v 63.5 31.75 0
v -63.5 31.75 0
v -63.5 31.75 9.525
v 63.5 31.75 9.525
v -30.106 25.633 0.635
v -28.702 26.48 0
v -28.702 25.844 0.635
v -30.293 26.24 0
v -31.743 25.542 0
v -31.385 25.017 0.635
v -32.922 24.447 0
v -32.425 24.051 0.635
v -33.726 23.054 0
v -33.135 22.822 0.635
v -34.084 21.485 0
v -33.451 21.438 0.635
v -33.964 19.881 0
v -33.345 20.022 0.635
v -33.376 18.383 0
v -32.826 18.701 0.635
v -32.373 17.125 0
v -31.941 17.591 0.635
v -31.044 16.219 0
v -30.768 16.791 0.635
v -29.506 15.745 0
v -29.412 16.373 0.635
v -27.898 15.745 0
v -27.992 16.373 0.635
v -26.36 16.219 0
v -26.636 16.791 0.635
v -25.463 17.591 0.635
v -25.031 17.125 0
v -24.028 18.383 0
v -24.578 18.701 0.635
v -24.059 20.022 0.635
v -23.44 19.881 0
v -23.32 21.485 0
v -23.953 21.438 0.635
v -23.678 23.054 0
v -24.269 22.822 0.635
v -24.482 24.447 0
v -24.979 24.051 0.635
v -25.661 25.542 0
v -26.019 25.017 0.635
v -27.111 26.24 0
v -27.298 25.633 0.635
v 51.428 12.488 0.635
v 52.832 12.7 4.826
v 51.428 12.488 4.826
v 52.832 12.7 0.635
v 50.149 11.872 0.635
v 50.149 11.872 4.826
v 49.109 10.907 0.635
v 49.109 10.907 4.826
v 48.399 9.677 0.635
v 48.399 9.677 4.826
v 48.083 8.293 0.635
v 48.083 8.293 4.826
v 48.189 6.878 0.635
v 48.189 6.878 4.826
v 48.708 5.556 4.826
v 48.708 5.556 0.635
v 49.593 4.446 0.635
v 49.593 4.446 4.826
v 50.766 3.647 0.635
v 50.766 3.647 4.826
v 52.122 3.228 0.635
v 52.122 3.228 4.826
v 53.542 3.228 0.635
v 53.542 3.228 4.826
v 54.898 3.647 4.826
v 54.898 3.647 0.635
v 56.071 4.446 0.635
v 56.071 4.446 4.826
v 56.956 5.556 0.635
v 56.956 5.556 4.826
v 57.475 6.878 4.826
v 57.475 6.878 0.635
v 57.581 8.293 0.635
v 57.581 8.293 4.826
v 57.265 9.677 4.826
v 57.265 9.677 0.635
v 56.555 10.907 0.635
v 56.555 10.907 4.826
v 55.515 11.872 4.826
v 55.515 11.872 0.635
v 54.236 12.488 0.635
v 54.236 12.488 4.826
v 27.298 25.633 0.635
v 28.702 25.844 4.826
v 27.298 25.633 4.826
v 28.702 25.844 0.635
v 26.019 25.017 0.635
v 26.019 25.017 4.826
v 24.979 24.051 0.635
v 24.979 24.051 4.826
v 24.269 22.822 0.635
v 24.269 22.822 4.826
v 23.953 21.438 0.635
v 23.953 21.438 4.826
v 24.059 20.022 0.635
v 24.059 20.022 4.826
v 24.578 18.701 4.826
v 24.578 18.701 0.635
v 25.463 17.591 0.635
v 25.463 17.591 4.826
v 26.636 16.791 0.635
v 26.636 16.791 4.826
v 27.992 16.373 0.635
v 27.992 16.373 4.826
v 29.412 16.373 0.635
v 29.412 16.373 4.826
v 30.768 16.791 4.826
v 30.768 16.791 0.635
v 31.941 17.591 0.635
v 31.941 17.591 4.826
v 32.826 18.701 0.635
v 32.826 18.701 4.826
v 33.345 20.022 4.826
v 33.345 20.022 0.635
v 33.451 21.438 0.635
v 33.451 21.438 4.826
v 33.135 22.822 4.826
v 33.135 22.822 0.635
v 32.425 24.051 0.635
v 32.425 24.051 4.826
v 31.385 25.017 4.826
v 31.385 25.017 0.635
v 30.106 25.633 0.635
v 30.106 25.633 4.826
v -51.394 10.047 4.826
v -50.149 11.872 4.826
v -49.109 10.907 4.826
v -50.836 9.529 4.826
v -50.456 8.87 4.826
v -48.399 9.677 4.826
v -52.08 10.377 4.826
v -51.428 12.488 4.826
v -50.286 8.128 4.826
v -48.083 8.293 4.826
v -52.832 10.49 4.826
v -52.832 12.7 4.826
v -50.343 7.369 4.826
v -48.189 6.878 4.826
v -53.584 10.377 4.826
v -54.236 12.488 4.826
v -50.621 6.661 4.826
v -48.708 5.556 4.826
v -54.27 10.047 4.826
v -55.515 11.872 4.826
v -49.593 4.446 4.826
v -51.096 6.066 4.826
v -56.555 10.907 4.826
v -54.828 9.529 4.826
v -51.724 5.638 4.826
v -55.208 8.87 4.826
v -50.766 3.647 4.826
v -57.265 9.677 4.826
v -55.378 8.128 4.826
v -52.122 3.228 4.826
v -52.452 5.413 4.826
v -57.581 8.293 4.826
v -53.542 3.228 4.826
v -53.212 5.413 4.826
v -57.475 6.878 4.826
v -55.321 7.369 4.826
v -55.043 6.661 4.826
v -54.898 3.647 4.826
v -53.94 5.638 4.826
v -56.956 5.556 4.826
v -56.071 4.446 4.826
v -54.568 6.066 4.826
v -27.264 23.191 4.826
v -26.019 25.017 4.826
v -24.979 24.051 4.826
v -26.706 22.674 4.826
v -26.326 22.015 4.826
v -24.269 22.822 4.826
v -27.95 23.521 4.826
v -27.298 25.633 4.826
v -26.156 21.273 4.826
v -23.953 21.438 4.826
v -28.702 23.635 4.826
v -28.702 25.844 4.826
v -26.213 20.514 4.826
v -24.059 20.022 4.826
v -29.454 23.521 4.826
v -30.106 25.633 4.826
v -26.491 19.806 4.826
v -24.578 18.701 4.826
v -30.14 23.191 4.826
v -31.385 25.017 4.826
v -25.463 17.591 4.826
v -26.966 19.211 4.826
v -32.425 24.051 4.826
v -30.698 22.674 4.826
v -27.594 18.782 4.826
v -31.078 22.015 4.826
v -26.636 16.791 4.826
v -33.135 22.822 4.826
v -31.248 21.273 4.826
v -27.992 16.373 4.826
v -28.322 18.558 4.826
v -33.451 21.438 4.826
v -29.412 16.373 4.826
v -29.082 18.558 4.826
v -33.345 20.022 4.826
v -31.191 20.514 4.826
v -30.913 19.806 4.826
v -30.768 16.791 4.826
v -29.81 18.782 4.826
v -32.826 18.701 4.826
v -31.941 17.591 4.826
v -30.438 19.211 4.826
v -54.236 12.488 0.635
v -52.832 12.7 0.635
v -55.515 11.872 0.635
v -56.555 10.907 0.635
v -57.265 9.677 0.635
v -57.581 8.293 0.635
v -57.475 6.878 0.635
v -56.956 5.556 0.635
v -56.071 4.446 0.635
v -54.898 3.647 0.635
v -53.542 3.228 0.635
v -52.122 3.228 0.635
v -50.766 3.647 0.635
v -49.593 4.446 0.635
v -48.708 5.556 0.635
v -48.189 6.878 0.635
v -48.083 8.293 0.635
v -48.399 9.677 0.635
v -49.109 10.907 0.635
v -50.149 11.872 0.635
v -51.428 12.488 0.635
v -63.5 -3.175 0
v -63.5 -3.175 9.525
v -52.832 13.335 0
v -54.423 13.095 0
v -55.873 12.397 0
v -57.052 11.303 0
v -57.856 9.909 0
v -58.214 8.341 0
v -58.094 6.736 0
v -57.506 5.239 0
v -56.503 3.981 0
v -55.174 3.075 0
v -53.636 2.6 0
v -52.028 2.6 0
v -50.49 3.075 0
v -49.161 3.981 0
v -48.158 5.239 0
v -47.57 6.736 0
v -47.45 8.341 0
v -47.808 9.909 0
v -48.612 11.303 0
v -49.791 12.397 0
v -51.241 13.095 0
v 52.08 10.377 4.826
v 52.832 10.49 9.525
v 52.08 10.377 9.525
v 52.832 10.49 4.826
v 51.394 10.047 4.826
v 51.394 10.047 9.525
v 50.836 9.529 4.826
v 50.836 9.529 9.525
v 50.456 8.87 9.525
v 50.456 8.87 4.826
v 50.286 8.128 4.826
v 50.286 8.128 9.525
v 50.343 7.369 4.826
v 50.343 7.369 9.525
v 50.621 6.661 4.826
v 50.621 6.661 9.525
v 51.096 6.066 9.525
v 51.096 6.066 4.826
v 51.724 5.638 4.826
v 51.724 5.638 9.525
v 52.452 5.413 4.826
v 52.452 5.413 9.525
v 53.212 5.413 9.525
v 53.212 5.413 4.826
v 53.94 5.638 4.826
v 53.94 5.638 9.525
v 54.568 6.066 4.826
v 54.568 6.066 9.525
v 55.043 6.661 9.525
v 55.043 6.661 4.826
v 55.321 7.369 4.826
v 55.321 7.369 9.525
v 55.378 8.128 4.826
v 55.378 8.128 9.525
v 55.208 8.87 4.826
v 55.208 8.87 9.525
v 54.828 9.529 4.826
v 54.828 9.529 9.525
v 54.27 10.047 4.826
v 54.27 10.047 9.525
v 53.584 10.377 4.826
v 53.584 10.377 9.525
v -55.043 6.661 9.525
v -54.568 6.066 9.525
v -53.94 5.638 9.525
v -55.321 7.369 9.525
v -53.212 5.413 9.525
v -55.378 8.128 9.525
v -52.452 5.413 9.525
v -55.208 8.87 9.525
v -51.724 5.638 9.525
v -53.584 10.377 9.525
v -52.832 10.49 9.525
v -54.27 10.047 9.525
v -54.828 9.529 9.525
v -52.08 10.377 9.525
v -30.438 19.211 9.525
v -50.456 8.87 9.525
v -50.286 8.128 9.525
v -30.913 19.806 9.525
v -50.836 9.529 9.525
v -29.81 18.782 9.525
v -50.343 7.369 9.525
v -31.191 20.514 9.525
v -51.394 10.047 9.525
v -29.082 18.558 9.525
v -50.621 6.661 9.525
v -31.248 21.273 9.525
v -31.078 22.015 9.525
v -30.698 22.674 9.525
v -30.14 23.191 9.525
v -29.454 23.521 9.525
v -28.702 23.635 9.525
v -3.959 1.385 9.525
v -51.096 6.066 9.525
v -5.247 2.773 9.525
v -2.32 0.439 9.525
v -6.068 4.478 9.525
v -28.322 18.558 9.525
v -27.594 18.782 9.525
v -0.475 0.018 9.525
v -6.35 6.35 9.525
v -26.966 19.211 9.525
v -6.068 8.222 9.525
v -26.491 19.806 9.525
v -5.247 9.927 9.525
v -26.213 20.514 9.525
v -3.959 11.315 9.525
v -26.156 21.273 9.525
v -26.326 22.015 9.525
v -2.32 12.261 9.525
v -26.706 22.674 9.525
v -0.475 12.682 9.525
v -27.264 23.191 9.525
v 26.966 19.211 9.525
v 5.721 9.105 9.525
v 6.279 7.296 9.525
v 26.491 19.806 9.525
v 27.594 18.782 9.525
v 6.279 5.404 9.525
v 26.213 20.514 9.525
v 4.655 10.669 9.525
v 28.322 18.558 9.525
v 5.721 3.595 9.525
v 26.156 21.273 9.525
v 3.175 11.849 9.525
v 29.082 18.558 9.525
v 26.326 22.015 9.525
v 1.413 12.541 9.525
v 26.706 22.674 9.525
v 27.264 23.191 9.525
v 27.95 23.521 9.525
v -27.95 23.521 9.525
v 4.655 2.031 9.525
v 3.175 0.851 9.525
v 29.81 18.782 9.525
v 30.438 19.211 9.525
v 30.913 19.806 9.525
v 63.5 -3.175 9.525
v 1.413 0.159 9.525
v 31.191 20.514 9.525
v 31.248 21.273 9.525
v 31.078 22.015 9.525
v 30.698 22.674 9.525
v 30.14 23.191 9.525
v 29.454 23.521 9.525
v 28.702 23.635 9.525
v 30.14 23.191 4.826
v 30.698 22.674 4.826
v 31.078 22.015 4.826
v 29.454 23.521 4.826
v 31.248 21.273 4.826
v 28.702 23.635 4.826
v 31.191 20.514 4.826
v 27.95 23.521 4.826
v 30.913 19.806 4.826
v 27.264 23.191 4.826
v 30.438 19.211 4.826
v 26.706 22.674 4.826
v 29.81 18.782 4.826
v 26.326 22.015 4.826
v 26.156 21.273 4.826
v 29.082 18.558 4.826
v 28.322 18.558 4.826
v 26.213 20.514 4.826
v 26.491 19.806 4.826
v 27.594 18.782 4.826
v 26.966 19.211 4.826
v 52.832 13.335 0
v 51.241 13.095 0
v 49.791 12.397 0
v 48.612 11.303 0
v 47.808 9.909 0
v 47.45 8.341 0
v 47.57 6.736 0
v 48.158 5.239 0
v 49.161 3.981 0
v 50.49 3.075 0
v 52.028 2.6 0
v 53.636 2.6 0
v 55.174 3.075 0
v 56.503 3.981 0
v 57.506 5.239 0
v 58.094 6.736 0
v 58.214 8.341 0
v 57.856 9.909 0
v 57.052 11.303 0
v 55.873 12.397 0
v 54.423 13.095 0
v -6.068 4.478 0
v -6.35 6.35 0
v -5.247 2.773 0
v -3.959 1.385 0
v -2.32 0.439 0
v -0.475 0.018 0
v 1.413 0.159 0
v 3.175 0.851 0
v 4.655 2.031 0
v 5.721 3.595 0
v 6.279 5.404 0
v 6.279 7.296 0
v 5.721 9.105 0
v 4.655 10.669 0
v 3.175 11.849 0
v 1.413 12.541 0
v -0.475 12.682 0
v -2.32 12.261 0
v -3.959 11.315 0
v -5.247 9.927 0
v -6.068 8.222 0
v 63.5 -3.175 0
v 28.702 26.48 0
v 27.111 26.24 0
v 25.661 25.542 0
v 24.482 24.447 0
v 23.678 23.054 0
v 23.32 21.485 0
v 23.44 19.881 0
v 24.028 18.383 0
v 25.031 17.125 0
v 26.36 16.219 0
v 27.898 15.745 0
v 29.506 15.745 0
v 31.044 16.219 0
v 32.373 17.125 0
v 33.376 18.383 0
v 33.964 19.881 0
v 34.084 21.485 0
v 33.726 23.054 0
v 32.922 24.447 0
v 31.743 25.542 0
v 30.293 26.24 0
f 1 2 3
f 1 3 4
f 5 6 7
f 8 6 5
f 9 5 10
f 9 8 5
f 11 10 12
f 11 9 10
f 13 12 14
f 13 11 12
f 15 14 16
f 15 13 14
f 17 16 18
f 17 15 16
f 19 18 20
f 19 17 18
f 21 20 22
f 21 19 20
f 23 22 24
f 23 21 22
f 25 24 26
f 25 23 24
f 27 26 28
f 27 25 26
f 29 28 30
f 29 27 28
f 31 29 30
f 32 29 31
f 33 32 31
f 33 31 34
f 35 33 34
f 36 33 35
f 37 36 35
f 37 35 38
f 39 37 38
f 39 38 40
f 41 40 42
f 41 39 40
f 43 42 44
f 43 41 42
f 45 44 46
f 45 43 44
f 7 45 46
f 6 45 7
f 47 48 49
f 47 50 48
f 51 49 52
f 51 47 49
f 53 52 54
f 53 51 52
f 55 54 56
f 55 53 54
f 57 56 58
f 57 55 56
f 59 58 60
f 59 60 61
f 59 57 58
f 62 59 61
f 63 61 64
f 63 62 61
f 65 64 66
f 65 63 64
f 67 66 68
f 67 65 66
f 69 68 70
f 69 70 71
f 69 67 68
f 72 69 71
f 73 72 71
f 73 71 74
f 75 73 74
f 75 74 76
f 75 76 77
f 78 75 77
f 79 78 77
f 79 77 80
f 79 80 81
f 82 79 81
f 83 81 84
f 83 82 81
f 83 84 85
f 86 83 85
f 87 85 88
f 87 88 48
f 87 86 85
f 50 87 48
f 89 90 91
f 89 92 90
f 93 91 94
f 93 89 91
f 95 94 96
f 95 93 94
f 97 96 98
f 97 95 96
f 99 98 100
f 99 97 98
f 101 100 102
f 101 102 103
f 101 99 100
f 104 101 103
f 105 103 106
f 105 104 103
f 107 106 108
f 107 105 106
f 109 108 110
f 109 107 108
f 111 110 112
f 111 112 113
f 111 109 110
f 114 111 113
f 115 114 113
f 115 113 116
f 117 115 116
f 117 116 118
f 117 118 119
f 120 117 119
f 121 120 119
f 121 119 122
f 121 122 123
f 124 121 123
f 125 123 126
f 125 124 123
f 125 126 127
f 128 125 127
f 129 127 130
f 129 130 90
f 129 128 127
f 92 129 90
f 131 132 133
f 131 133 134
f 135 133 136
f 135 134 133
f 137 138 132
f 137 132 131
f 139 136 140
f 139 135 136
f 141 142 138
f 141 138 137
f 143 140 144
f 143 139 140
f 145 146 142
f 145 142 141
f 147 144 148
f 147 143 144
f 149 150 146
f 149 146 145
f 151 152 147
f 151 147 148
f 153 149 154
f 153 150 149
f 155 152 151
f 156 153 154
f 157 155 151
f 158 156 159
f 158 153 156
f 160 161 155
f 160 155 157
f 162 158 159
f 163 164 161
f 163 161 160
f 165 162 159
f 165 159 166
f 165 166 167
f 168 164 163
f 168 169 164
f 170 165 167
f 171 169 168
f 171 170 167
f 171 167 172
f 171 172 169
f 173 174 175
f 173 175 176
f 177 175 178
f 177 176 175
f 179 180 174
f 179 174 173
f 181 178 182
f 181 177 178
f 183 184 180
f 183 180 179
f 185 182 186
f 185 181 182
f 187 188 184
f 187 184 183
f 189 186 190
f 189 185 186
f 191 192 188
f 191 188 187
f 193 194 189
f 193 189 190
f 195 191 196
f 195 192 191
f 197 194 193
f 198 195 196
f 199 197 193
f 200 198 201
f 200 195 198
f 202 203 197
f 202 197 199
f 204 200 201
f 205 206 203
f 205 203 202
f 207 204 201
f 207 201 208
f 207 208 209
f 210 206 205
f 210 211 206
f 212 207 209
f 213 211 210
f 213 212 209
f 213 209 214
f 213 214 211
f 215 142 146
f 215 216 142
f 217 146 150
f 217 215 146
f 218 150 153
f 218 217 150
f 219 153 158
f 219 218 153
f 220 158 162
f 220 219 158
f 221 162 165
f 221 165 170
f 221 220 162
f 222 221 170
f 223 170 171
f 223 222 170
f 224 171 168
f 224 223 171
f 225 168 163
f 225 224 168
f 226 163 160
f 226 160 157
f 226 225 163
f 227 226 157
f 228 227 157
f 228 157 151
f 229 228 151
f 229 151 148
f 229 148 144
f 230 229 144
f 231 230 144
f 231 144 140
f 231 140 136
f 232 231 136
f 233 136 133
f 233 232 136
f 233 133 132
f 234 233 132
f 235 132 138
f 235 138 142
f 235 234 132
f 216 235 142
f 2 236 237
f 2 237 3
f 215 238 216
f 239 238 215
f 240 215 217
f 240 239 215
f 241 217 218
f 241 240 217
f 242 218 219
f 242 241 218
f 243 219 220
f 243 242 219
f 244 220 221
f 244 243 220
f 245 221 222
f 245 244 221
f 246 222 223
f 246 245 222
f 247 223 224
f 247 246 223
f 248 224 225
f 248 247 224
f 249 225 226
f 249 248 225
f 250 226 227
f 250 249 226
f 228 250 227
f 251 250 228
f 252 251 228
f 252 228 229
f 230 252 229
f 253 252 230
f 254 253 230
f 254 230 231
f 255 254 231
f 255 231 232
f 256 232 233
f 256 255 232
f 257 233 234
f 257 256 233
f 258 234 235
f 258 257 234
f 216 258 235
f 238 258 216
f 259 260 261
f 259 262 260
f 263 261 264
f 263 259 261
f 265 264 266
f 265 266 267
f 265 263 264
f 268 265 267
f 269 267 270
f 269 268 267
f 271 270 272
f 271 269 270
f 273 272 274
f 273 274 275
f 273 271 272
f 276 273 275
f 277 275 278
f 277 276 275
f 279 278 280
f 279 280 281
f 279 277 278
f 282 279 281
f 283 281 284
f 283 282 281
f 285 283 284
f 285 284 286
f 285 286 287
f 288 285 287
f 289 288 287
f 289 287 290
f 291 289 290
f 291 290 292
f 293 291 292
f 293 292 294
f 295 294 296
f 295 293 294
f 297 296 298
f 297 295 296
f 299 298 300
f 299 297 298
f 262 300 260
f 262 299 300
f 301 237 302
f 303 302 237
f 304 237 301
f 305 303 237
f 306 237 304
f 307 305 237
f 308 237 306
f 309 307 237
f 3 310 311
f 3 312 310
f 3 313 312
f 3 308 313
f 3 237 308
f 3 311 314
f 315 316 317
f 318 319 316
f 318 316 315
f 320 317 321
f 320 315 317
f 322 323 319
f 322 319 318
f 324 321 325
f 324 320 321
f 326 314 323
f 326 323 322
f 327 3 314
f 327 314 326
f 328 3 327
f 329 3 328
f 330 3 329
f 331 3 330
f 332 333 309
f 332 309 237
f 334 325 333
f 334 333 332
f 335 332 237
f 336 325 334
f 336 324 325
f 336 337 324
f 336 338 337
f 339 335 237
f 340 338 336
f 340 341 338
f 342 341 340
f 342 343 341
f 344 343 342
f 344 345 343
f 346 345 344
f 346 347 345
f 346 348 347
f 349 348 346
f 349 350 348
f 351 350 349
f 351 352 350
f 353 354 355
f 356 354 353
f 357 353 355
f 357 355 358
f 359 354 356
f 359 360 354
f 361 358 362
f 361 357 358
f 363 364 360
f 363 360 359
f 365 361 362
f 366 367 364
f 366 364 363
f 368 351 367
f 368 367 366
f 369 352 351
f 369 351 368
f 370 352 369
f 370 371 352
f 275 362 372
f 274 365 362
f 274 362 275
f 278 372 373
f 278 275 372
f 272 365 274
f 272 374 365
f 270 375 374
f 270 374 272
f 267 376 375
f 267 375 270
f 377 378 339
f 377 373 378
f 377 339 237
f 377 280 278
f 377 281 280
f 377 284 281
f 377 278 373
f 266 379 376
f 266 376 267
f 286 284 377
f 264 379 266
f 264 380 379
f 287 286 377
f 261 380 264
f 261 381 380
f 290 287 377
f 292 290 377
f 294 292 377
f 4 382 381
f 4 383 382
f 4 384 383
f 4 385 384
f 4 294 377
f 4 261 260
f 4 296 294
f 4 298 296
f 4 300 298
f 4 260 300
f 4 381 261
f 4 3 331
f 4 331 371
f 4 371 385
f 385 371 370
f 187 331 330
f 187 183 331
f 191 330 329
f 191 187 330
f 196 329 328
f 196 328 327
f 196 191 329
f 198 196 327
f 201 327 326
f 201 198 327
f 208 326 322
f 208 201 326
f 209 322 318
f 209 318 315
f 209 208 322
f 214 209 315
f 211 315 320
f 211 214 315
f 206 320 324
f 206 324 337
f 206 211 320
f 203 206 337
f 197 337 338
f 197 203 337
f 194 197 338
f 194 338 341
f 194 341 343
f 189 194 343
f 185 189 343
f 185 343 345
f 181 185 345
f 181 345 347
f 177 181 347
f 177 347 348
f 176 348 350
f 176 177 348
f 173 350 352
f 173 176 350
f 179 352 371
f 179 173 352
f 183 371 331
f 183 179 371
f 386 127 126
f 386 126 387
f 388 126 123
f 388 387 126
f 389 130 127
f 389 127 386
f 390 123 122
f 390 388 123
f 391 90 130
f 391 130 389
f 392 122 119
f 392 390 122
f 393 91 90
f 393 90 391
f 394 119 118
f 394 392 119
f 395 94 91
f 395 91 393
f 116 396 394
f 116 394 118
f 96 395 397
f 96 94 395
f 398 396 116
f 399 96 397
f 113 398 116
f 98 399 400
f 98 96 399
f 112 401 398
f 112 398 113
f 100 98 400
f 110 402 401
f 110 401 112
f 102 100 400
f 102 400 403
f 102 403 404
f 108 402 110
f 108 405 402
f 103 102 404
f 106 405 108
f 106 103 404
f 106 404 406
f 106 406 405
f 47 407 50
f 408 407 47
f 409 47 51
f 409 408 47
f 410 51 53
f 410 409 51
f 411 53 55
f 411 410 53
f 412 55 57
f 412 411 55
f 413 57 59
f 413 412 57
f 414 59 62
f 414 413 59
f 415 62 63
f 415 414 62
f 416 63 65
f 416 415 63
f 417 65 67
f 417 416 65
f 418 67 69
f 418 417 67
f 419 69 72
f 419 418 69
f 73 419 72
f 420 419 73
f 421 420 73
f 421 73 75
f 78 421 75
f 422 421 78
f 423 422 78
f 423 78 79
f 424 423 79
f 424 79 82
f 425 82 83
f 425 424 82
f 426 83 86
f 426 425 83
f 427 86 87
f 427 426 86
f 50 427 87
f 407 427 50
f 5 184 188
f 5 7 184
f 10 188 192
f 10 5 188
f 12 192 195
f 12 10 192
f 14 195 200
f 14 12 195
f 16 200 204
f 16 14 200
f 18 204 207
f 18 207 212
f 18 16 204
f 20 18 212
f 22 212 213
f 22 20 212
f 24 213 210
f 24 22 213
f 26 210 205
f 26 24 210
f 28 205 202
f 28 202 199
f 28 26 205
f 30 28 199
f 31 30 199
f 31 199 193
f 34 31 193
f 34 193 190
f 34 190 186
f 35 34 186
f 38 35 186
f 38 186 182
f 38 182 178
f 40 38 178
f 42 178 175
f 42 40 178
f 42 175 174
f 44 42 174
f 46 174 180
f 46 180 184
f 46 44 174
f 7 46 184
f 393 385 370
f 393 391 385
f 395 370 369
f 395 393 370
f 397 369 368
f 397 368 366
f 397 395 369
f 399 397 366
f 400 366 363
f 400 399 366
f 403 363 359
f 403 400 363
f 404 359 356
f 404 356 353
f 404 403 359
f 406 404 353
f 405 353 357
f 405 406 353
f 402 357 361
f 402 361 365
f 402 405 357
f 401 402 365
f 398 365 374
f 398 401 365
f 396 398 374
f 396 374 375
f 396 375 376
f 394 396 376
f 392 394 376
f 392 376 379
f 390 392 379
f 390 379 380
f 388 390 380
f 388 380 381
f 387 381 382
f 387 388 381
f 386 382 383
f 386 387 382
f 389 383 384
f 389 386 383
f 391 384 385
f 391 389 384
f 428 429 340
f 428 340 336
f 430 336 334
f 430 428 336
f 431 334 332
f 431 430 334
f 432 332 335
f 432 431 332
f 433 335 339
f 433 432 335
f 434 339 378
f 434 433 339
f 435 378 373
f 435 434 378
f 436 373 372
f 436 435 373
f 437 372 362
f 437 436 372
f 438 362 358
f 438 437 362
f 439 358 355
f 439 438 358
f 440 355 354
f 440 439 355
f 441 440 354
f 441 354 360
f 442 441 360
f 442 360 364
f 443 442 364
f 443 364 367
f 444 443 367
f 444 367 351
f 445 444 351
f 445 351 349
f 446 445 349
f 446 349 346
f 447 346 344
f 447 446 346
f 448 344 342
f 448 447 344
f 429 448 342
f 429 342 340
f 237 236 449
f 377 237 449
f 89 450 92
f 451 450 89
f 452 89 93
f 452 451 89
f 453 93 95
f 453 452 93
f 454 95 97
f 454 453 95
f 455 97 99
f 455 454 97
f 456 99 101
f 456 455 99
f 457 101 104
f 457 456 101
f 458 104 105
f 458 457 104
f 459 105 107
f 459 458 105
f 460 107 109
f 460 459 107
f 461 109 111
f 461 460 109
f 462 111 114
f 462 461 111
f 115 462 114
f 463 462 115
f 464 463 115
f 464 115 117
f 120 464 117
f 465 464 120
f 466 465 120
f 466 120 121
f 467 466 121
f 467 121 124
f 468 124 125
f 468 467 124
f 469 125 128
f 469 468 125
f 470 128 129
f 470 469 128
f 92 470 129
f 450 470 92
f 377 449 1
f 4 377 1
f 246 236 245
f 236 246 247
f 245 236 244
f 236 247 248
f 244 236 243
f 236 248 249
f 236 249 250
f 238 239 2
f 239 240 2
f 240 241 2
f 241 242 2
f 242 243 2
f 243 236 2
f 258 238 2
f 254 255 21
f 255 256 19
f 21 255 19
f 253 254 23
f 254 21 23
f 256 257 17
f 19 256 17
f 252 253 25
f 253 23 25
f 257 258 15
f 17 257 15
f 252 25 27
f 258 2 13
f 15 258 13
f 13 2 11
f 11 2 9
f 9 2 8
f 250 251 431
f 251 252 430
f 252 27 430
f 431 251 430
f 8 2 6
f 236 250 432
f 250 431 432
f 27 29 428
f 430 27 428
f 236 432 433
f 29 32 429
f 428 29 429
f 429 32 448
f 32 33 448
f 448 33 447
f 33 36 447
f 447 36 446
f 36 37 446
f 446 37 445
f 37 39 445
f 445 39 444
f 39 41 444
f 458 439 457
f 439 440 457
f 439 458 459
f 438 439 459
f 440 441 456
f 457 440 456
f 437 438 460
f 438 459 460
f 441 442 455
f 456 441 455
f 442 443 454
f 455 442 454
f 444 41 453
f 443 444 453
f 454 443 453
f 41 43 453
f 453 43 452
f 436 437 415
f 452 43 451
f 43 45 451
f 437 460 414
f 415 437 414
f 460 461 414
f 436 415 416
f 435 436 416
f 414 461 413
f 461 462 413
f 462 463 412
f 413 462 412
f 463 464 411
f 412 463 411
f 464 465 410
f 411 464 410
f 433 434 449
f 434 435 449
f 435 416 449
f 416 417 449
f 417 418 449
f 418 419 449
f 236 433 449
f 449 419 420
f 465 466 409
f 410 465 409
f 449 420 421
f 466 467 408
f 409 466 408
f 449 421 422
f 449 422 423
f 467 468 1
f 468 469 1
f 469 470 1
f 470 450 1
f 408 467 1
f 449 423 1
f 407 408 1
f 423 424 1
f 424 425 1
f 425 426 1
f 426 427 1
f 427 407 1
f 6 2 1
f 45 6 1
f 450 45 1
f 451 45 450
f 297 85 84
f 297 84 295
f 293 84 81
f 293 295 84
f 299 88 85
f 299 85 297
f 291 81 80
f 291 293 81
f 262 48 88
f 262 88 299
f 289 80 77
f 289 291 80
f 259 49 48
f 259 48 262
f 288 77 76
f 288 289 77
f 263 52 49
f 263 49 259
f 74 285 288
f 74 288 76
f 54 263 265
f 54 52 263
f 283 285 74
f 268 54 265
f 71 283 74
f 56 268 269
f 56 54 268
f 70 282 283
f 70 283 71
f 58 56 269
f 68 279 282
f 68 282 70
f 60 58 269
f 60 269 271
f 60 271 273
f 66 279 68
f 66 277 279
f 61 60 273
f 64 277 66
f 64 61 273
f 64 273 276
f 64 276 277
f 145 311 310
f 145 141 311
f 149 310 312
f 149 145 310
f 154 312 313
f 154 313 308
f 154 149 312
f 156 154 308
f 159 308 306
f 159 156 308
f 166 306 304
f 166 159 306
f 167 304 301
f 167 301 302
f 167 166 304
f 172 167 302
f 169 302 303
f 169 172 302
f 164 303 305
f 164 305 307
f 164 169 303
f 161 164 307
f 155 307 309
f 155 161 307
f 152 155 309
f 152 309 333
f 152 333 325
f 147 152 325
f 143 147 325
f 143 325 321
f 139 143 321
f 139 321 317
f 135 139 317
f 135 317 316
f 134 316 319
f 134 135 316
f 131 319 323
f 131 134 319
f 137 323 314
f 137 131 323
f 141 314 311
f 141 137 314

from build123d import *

# Parameters (mm, degrees)
SKETCH1_W                                    = 127
SKETCH1_H                                    = 34.925
SKETCH1_R                                    = 6.35
BOSS_EXTRUDE1_DEPTH                          = 9.525
CBORE_FOR_10_SOCKET_HEAD_CAP_SCREW1_AT_COUNT = 2
CBORE_FOR_10_SOCKET_HEAD_CAP_SCREW1_AT_PITCH = 27.477896212
CBORE_FOR_10_SOCKET_HEAD_CAP_SCREW1_2_COUNT  = 2
CBORE_FOR_10_SOCKET_HEAD_CAP_SCREW1_2_PITCH  = 57.404
CBORE_FOR_10_SOCKET_HEAD_CAP_SCREW1_3_COUNT  = 2
CBORE_FOR_10_SOCKET_HEAD_CAP_SCREW1_3_PITCH  = 82.586748551


with BuildPart() as part:
    # Sketch1 → Boss-Extrude1 (new body)
    with BuildSketch(Plane.XY):
        with Locations((0, 14.2875)):
            Rectangle(SKETCH1_W, SKETCH1_H)
        with Locations(Location((0, 6.35, 0), (0, 0, 180))):
            Circle(SKETCH1_R, mode=Mode.SUBTRACT)
    extrude(amount=BOSS_EXTRUDE1_DEPTH)

    # Sketch7 → CBORE for #10 Socket Head Cap Screw1 (revolve, cut)
    with BuildSketch(Plane(origin=(28.702, 21.082, 0), x_dir=(0, 1, 0), z_dir=(1, 0, 0))):
        Polygon((0, 0), (0, 9.525), (2.5527, 9.525), (2.5527, 4.826), (4.7625, 4.826), (4.7625, 0.635), (5.3975, 0), align=None)
    cbore_for_10_socket_head_cap_screw1 = revolve(axis=Axis((28.702, 21.082, -6.35), (0, 0, 1)), mode=Mode.SUBTRACT)

    # CBORE for #10 Socket Head Cap Screw1 at: CBORE for #10 Socket Head Cap Screw1 ×2
    with Locations(*[Vector(0.878160388030778, -0.47836631663781837, 0) * (i * CBORE_FOR_10_SOCKET_HEAD_CAP_SCREW1_AT_PITCH) for i in range(1, CBORE_FOR_10_SOCKET_HEAD_CAP_SCREW1_AT_COUNT)]):
        add(cbore_for_10_socket_head_cap_screw1, mode=Mode.SUBTRACT)

    # CBORE for _10 Socket Head Cap Screw1 2: CBORE for #10 Socket Head Cap Screw1 ×2
    with Locations(*[(-i * CBORE_FOR_10_SOCKET_HEAD_CAP_SCREW1_2_PITCH, 0, 0) for i in range(1, CBORE_FOR_10_SOCKET_HEAD_CAP_SCREW1_2_COUNT)]):
        add(cbore_for_10_socket_head_cap_screw1, mode=Mode.SUBTRACT)

    # CBORE for _10 Socket Head Cap Screw1 3: CBORE for #10 Socket Head Cap Screw1 ×2
    with Locations(*[Vector(-0.9872528151354362, -0.1591599164587503, 0) * (i * CBORE_FOR_10_SOCKET_HEAD_CAP_SCREW1_3_PITCH) for i in range(1, CBORE_FOR_10_SOCKET_HEAD_CAP_SCREW1_3_COUNT)]):
        add(cbore_for_10_socket_head_cap_screw1, mode=Mode.SUBTRACT)


solid = part.part
